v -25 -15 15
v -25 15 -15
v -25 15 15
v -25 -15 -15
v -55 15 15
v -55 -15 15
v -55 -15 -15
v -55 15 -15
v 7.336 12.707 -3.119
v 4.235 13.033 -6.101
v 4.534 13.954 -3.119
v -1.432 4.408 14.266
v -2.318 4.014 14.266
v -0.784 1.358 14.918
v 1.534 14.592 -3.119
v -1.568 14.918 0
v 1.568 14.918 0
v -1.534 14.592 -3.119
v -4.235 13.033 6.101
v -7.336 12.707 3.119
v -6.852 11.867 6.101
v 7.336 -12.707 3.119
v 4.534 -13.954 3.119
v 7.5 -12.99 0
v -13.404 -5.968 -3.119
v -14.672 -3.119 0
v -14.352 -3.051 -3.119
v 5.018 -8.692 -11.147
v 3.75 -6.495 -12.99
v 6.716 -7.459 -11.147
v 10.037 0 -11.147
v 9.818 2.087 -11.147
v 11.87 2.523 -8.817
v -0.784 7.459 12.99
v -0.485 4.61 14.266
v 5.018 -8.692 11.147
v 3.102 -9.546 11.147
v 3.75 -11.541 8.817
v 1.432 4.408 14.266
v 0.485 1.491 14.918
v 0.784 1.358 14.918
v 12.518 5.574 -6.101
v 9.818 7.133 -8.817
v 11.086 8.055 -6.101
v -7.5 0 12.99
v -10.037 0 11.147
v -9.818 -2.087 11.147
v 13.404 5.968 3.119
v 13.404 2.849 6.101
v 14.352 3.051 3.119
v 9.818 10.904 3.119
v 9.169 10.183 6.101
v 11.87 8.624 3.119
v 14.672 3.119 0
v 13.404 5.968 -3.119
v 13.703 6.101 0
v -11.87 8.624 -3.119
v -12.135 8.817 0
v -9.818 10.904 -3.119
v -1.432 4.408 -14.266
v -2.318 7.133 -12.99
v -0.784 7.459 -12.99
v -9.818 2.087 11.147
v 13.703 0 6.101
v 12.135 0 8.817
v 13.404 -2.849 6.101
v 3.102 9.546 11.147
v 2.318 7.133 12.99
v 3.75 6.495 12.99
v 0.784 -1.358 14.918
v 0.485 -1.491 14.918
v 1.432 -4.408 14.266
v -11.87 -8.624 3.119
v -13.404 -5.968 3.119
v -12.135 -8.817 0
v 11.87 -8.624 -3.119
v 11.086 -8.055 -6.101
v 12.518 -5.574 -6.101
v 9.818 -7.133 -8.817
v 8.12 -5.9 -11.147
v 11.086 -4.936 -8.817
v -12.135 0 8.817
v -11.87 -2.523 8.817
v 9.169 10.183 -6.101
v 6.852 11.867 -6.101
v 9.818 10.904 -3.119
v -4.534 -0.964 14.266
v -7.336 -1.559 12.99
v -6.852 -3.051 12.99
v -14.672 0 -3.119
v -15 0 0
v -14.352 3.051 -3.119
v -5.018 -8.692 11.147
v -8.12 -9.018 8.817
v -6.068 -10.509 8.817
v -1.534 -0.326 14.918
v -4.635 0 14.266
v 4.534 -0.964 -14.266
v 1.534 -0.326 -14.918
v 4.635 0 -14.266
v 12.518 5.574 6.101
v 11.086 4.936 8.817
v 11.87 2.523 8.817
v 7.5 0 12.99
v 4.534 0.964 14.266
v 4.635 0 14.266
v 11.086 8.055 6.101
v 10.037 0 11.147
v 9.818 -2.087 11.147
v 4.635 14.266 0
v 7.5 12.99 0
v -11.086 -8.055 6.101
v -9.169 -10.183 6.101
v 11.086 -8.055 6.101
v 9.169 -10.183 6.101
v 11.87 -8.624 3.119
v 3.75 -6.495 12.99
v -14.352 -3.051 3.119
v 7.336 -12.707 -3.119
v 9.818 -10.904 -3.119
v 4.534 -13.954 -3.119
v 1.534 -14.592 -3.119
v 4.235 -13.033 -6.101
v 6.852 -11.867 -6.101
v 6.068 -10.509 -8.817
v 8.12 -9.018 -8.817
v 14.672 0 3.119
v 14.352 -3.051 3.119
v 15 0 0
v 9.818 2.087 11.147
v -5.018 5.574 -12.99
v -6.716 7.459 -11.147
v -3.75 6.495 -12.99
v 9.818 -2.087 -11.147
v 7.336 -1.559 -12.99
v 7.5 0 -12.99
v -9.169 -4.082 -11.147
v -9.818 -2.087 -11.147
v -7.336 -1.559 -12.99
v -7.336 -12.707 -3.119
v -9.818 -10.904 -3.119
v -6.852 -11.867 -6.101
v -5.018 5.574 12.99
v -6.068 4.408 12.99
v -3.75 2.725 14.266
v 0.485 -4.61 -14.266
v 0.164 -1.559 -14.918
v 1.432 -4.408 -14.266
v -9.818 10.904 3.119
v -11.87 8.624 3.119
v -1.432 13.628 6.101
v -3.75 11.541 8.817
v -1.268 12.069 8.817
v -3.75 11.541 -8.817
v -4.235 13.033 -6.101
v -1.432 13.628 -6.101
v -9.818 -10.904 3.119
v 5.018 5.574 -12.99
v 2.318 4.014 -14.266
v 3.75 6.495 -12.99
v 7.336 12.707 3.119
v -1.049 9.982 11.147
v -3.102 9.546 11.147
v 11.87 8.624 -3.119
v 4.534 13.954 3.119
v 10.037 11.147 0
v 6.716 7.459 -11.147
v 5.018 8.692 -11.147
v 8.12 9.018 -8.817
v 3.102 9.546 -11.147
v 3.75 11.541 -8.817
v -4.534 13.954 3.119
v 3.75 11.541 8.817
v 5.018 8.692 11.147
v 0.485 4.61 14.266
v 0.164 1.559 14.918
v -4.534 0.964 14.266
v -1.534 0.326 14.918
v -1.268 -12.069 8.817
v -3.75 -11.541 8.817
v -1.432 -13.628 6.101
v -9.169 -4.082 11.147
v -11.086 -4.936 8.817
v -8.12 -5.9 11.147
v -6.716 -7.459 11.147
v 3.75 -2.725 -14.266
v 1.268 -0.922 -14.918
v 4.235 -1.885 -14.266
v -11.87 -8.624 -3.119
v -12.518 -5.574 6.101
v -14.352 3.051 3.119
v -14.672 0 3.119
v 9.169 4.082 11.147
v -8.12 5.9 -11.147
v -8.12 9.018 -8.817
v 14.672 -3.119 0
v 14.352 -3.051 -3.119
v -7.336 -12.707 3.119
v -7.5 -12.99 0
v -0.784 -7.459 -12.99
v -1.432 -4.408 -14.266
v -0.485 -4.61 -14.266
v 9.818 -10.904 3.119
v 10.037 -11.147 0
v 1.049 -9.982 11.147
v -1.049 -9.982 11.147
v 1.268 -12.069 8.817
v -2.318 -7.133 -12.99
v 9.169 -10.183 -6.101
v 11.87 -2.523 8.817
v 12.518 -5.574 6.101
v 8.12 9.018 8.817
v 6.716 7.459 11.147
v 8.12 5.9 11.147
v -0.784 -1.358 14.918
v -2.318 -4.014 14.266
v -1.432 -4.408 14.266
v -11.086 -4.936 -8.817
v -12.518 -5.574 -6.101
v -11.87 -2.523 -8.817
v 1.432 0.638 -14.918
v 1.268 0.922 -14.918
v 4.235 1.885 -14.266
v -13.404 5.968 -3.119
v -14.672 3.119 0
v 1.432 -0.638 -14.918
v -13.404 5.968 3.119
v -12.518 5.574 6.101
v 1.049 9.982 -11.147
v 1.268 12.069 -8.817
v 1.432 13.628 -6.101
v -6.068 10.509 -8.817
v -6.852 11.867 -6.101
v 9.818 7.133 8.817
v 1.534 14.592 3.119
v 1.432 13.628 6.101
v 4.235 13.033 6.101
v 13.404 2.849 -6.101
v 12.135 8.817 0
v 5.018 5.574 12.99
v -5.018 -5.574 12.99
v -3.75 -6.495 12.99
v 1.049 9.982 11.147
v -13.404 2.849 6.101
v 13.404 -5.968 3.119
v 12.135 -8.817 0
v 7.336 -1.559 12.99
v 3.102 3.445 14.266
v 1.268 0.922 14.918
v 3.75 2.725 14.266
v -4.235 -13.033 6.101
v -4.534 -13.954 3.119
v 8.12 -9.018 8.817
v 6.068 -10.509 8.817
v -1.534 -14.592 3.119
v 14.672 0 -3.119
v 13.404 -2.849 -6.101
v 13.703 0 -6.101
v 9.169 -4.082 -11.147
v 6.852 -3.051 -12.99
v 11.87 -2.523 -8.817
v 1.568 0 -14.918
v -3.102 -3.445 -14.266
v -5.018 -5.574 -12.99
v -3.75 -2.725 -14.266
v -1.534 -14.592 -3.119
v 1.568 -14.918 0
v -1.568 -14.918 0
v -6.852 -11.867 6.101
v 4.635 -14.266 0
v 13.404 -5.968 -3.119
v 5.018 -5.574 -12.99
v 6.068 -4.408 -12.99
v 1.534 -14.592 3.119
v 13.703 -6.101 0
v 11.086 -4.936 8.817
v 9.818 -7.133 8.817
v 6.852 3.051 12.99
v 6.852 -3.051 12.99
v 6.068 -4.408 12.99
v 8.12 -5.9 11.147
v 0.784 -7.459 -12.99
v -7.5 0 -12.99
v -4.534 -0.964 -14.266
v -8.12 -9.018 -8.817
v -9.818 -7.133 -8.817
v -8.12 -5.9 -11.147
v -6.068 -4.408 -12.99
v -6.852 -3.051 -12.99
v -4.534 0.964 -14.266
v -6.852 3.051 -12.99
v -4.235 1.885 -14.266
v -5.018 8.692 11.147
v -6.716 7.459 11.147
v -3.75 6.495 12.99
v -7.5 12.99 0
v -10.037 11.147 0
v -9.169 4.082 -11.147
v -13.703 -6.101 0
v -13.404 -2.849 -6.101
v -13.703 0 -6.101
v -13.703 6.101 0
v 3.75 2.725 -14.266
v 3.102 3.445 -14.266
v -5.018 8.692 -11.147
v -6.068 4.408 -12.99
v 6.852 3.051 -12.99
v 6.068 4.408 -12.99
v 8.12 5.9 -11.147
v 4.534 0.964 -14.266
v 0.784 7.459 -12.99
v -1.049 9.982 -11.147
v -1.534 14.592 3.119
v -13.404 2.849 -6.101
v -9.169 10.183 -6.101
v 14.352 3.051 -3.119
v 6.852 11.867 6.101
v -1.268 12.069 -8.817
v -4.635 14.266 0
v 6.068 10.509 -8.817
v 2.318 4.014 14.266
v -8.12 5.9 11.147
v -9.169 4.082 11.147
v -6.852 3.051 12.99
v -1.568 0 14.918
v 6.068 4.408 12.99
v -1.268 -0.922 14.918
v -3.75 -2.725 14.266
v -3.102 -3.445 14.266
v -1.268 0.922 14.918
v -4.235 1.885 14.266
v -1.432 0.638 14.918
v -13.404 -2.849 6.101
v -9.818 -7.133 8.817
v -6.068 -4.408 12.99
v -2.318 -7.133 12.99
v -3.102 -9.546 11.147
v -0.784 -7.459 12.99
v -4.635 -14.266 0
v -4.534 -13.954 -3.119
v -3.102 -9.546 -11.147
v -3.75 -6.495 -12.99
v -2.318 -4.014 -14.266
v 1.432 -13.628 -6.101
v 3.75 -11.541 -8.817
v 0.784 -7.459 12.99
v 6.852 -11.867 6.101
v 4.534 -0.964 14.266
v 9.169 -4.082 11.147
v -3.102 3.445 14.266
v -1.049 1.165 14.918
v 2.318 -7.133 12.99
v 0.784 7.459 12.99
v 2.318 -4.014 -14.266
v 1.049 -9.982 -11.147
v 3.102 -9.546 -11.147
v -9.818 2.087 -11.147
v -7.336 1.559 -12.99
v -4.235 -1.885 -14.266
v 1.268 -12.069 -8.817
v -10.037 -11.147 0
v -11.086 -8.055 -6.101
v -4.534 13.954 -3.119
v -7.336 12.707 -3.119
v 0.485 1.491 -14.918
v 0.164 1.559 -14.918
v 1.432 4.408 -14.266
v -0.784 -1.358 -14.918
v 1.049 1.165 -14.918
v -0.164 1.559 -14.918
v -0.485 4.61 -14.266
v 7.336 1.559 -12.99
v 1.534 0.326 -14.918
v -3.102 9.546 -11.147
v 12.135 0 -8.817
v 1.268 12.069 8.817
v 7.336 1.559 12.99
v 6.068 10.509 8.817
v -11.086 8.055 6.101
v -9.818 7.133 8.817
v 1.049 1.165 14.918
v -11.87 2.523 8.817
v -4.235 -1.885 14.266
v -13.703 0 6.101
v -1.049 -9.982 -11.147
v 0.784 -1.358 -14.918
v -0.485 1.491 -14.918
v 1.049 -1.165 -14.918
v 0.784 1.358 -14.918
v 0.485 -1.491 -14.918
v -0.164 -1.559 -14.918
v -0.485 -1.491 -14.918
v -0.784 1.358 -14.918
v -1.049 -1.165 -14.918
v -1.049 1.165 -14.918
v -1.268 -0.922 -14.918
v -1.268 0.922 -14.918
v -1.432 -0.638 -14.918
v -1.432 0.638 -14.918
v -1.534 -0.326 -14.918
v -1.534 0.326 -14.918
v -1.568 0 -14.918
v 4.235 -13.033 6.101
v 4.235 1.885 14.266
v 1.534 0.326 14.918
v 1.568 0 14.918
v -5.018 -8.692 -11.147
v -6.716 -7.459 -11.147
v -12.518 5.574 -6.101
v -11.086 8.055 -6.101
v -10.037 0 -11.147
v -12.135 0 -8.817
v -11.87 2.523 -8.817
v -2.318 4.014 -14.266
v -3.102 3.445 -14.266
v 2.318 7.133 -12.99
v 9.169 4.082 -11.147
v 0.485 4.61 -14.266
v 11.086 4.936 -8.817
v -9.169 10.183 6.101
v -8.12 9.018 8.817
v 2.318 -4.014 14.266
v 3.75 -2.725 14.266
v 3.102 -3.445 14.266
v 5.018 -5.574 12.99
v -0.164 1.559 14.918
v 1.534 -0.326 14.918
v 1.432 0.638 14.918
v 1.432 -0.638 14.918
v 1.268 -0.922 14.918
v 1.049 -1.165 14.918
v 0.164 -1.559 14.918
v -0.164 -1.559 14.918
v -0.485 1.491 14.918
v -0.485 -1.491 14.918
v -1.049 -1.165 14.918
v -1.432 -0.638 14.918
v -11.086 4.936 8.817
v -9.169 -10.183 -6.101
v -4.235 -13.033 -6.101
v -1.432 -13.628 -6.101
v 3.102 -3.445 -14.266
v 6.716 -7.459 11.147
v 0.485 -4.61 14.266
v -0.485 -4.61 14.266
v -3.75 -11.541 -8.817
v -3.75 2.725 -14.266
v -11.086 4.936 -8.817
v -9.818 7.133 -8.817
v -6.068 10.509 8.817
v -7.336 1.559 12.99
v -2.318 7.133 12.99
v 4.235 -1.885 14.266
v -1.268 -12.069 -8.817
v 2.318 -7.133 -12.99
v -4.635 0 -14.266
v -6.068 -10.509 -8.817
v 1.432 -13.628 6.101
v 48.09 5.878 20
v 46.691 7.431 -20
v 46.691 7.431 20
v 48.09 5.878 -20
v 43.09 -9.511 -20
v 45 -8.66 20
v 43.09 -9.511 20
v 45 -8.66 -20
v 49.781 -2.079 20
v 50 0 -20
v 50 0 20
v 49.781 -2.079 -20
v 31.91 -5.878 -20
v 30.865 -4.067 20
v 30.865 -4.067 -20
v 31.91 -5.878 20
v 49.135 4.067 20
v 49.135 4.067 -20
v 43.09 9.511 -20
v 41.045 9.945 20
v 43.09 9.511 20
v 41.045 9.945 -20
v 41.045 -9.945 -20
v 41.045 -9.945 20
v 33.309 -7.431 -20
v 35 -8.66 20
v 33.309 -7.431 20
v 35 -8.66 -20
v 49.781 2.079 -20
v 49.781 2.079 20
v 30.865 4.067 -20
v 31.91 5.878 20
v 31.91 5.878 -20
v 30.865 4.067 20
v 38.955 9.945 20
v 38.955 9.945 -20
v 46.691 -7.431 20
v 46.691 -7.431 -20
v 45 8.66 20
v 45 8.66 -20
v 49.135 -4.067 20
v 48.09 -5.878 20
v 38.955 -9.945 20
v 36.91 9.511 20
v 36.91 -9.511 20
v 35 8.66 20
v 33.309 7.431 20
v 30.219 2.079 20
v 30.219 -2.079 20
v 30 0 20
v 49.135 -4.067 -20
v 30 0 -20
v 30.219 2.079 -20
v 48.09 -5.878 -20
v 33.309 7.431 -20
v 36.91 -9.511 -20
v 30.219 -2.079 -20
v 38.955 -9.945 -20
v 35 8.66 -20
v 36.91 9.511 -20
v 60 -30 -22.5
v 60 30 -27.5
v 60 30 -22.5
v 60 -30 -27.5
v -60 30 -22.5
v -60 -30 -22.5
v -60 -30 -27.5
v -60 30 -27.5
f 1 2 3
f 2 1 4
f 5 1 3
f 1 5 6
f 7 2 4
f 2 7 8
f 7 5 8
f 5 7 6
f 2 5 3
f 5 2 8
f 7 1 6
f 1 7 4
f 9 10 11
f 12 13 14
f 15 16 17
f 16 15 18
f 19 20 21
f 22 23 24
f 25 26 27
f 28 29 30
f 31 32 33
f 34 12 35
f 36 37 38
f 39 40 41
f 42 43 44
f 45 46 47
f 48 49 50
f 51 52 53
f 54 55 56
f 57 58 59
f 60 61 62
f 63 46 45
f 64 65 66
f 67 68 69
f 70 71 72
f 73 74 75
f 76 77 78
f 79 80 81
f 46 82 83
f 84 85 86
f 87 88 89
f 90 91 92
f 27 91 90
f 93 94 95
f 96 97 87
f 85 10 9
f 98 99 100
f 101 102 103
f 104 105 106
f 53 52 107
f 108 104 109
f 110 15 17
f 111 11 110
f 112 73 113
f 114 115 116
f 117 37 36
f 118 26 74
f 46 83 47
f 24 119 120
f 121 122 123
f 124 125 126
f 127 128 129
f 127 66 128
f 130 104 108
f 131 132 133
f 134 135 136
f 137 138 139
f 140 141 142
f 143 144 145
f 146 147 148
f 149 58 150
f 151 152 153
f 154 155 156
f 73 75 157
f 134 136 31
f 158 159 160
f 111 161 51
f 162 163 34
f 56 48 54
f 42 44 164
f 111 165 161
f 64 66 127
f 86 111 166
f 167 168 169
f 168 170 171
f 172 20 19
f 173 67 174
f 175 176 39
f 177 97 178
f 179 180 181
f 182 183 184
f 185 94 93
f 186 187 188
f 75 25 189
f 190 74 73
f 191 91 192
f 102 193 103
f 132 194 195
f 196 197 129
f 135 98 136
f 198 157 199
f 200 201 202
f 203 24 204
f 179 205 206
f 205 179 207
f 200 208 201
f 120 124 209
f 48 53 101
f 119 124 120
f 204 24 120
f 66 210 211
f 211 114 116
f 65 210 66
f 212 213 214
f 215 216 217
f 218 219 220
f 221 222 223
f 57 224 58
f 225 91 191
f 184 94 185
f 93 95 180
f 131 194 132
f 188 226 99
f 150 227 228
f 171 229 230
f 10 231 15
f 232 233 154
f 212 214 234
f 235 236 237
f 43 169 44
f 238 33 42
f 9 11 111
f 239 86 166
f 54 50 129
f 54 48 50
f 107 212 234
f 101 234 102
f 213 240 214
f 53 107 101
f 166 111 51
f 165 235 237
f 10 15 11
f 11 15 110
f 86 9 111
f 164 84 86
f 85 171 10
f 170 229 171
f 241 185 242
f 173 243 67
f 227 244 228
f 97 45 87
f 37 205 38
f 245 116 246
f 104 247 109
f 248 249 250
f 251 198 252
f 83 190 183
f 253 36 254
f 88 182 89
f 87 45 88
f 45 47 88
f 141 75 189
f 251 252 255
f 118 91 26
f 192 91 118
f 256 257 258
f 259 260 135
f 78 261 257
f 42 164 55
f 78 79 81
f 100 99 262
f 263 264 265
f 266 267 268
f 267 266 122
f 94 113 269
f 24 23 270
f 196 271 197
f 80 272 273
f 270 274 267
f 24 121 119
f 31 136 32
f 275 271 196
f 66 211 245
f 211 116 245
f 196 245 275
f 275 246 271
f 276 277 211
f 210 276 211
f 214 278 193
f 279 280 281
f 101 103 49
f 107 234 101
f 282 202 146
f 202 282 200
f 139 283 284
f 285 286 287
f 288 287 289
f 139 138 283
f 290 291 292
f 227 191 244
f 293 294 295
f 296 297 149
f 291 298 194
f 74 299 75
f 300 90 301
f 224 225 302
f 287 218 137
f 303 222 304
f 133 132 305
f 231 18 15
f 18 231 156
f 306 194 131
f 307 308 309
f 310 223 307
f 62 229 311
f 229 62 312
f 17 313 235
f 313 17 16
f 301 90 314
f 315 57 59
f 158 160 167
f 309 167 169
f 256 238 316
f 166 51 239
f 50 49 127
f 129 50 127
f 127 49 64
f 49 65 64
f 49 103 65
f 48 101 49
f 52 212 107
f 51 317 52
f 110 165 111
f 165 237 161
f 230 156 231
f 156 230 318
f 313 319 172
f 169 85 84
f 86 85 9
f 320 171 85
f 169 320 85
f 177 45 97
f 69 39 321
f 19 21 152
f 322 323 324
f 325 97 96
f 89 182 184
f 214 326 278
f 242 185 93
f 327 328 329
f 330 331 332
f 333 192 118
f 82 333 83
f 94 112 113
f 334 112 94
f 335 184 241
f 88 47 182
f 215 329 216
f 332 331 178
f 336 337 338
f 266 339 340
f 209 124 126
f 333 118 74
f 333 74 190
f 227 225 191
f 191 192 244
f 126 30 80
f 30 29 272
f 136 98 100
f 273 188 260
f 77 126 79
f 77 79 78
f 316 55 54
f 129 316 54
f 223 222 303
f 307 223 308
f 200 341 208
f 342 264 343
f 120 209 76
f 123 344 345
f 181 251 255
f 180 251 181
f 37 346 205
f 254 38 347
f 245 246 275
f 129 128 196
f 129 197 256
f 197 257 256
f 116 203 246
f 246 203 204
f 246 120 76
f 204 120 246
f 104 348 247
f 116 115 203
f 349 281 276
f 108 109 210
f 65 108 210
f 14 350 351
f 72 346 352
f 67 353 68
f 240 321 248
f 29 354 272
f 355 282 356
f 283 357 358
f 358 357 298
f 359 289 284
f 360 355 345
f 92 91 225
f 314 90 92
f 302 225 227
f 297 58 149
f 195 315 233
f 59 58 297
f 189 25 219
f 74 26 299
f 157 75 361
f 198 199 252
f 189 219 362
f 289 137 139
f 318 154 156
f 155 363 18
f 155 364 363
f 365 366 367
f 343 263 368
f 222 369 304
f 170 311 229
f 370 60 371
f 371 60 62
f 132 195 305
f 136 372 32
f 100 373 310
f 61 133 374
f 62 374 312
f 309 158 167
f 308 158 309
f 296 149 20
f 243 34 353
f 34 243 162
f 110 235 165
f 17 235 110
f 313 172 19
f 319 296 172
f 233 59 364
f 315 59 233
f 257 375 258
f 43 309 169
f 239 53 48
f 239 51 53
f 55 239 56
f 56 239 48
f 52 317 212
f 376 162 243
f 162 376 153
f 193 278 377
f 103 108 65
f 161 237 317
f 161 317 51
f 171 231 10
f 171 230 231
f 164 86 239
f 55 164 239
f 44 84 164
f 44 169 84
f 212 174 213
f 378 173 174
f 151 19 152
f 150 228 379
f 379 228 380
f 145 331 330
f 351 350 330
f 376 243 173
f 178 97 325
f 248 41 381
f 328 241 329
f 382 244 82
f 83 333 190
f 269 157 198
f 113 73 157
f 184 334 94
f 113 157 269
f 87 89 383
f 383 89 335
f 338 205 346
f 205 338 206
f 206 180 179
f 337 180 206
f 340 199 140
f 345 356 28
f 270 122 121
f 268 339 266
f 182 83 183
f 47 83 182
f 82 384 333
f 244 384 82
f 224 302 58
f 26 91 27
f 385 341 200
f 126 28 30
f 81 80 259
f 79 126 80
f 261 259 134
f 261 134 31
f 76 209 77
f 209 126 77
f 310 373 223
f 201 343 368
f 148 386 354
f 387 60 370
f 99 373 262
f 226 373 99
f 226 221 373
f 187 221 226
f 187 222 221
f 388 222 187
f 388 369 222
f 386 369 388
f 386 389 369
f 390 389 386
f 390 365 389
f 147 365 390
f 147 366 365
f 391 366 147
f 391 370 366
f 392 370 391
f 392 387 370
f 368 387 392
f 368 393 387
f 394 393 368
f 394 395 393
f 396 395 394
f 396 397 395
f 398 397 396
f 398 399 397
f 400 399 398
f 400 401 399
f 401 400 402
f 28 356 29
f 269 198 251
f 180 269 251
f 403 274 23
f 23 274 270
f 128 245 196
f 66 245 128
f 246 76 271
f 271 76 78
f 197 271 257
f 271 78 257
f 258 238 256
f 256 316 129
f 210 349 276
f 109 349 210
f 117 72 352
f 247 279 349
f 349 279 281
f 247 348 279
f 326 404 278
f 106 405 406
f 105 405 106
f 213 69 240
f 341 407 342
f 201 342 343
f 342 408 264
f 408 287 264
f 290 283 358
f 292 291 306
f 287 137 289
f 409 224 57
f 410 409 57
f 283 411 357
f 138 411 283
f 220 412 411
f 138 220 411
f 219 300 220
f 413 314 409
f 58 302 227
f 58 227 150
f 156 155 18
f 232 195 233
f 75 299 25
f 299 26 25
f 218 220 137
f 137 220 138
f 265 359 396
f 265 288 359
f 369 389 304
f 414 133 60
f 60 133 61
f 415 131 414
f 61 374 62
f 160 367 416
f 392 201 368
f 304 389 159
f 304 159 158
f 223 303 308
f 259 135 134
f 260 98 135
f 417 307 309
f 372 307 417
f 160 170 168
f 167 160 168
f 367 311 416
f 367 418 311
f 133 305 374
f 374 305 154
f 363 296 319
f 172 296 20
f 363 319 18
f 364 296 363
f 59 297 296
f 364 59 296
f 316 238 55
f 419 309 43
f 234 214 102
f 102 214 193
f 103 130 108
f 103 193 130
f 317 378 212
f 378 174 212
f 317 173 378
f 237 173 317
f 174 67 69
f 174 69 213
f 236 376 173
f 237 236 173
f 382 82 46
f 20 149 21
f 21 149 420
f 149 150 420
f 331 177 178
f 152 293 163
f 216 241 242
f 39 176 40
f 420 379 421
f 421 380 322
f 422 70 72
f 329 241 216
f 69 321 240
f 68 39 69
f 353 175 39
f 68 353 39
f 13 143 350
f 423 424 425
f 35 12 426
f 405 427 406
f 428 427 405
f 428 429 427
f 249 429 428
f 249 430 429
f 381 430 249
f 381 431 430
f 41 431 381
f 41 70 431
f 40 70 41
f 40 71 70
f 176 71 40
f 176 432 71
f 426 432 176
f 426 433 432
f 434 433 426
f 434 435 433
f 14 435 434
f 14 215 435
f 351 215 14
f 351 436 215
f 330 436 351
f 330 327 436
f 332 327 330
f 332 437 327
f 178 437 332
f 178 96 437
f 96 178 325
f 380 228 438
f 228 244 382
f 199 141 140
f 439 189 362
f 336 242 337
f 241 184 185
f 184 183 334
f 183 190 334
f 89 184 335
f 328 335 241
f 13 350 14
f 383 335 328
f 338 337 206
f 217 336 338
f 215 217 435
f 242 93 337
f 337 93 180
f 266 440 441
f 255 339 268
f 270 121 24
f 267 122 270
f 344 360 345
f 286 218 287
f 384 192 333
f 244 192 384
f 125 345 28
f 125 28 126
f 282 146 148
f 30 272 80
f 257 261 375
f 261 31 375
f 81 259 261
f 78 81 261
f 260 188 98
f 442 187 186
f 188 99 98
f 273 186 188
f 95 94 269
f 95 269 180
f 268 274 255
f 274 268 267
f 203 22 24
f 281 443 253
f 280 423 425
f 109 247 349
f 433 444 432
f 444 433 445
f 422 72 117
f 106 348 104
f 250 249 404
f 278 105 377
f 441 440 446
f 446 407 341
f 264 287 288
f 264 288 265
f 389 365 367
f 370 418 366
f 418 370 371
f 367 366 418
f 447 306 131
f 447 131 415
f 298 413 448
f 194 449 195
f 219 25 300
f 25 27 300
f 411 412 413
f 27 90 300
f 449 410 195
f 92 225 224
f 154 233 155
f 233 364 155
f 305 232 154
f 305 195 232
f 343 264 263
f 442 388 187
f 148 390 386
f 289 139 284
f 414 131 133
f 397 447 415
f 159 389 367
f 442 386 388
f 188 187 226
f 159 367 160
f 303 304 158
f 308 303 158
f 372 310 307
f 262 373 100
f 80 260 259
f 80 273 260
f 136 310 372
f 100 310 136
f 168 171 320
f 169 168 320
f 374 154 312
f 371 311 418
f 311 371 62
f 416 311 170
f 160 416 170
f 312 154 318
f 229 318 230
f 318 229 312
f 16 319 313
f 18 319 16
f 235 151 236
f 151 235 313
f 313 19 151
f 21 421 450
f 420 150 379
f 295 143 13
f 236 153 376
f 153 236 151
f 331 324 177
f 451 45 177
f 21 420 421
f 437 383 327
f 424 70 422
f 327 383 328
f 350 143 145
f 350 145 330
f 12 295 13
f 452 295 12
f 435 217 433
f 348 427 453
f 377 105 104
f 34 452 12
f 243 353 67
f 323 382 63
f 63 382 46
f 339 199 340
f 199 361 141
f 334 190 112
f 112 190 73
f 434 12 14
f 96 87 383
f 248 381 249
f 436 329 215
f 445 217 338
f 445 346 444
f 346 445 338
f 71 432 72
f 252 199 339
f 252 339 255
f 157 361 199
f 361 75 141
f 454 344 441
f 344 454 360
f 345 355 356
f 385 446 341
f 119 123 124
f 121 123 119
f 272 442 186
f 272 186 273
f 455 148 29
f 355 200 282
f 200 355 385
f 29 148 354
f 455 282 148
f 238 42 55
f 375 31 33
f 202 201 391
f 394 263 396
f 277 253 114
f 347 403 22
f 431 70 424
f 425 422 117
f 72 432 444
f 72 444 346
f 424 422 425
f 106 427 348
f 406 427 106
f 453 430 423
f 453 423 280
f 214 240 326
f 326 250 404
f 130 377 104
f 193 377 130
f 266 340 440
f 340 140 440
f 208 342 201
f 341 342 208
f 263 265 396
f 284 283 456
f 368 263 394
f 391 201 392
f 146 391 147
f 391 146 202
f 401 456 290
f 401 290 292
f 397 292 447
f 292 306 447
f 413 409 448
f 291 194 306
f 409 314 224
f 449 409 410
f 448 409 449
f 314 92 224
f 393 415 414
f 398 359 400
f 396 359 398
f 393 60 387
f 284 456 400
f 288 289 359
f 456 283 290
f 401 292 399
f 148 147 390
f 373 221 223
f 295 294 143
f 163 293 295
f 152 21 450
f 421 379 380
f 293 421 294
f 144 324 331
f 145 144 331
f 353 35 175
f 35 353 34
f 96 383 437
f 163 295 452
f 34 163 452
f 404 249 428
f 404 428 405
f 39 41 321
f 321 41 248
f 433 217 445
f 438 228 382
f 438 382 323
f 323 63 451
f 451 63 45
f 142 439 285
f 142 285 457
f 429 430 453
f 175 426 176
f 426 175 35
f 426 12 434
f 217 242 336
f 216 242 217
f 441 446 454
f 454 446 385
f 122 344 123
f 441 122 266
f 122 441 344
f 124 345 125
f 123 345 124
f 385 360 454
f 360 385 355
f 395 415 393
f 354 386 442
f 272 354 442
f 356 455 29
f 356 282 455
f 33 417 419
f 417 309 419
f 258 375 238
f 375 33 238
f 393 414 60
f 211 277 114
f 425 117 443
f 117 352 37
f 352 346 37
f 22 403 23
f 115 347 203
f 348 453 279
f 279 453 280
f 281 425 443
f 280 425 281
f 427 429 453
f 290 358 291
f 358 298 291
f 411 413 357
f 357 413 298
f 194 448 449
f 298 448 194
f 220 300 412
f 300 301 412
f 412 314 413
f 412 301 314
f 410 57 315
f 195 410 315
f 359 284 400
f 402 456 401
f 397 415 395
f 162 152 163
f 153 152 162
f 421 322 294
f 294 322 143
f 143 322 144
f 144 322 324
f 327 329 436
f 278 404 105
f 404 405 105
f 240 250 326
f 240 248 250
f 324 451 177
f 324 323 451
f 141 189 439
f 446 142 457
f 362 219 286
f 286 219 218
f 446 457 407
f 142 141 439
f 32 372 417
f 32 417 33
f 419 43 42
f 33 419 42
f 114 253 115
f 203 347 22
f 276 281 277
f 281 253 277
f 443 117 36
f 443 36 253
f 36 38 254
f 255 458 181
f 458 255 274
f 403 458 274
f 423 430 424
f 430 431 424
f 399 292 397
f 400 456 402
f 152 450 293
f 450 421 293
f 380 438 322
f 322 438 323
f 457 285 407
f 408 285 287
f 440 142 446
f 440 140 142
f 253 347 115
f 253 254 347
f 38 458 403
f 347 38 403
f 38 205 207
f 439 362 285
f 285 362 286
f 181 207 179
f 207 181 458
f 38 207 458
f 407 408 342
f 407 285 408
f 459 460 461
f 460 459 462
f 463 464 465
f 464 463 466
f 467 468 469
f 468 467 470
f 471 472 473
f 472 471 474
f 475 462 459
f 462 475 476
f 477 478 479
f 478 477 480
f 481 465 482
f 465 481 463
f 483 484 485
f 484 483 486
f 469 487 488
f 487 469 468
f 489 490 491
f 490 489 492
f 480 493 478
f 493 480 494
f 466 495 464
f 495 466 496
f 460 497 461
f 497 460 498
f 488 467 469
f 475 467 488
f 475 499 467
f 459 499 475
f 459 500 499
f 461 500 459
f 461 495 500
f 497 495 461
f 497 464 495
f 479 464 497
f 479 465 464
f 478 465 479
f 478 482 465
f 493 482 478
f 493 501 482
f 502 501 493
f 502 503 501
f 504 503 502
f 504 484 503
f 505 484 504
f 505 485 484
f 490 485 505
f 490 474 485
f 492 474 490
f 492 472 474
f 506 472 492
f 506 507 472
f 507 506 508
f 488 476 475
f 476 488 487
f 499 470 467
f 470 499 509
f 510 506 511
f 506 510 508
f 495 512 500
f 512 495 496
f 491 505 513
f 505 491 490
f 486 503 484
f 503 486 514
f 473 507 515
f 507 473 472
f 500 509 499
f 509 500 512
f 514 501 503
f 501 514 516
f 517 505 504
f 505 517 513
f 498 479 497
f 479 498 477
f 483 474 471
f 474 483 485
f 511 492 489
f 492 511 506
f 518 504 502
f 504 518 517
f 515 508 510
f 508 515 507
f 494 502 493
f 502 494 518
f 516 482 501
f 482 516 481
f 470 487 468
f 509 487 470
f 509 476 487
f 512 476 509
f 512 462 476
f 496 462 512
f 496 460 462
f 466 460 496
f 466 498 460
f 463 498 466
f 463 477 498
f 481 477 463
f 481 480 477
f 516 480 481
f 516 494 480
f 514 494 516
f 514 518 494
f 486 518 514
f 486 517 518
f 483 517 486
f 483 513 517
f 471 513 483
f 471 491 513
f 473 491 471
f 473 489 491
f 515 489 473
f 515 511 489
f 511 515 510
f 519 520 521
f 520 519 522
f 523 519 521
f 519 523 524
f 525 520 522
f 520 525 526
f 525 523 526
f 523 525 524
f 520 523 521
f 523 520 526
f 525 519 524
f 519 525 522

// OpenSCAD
// Computer Vision Control Demo
// This is a simple model to test hand gesture controls
// Try using different gestures to interact with this model!

// Parameters for customization
cube_size = 30;      // Size of the cube
sphere_radius = 15;  // Radius of the sphere
cylinder_height = 40; // Height of the cylinder
cylinder_radius = 10; // Radius of the cylinder

// Create a colorful composite object
color("red")
translate([-40, 0, 0])
cube(cube_size, center=true);

color("green")
translate([0, 0, 0])
sphere(r=sphere_radius);

color("blue")
translate([40, 0, 0])
cylinder(h=cylinder_height, r=cylinder_radius, center=true);

// Add a base platform
color("gray", 0.5)
translate([0, 0, -25])
cube([120, 60, 5], center=true);

// Instructions as text (comment)
/*
CV CONTROL GESTURES TO TRY:

1. 👆 POINT - Index finger up
   Hover over different colored objects

2. 🤏 GRAB - Pinch with index + thumb
   Grab the model

3. 🤏➡️ DRAG - Hold pinch and move
   Rotate the model by moving your hand

4. ✋ DROP - Open hand
   Release the model

5. ✊ ORBIT - Closed fist + move
   Rotate camera around the model

6. ✋ PAN - Open palm + move
   Slide the camera view

7. 🤲 ZOOM - Two hands pinching
   Move hands apart to zoom in
   Move hands together to zoom out

Remember: Keep your hands in the center 70% of the screen (active zone)!
*/
